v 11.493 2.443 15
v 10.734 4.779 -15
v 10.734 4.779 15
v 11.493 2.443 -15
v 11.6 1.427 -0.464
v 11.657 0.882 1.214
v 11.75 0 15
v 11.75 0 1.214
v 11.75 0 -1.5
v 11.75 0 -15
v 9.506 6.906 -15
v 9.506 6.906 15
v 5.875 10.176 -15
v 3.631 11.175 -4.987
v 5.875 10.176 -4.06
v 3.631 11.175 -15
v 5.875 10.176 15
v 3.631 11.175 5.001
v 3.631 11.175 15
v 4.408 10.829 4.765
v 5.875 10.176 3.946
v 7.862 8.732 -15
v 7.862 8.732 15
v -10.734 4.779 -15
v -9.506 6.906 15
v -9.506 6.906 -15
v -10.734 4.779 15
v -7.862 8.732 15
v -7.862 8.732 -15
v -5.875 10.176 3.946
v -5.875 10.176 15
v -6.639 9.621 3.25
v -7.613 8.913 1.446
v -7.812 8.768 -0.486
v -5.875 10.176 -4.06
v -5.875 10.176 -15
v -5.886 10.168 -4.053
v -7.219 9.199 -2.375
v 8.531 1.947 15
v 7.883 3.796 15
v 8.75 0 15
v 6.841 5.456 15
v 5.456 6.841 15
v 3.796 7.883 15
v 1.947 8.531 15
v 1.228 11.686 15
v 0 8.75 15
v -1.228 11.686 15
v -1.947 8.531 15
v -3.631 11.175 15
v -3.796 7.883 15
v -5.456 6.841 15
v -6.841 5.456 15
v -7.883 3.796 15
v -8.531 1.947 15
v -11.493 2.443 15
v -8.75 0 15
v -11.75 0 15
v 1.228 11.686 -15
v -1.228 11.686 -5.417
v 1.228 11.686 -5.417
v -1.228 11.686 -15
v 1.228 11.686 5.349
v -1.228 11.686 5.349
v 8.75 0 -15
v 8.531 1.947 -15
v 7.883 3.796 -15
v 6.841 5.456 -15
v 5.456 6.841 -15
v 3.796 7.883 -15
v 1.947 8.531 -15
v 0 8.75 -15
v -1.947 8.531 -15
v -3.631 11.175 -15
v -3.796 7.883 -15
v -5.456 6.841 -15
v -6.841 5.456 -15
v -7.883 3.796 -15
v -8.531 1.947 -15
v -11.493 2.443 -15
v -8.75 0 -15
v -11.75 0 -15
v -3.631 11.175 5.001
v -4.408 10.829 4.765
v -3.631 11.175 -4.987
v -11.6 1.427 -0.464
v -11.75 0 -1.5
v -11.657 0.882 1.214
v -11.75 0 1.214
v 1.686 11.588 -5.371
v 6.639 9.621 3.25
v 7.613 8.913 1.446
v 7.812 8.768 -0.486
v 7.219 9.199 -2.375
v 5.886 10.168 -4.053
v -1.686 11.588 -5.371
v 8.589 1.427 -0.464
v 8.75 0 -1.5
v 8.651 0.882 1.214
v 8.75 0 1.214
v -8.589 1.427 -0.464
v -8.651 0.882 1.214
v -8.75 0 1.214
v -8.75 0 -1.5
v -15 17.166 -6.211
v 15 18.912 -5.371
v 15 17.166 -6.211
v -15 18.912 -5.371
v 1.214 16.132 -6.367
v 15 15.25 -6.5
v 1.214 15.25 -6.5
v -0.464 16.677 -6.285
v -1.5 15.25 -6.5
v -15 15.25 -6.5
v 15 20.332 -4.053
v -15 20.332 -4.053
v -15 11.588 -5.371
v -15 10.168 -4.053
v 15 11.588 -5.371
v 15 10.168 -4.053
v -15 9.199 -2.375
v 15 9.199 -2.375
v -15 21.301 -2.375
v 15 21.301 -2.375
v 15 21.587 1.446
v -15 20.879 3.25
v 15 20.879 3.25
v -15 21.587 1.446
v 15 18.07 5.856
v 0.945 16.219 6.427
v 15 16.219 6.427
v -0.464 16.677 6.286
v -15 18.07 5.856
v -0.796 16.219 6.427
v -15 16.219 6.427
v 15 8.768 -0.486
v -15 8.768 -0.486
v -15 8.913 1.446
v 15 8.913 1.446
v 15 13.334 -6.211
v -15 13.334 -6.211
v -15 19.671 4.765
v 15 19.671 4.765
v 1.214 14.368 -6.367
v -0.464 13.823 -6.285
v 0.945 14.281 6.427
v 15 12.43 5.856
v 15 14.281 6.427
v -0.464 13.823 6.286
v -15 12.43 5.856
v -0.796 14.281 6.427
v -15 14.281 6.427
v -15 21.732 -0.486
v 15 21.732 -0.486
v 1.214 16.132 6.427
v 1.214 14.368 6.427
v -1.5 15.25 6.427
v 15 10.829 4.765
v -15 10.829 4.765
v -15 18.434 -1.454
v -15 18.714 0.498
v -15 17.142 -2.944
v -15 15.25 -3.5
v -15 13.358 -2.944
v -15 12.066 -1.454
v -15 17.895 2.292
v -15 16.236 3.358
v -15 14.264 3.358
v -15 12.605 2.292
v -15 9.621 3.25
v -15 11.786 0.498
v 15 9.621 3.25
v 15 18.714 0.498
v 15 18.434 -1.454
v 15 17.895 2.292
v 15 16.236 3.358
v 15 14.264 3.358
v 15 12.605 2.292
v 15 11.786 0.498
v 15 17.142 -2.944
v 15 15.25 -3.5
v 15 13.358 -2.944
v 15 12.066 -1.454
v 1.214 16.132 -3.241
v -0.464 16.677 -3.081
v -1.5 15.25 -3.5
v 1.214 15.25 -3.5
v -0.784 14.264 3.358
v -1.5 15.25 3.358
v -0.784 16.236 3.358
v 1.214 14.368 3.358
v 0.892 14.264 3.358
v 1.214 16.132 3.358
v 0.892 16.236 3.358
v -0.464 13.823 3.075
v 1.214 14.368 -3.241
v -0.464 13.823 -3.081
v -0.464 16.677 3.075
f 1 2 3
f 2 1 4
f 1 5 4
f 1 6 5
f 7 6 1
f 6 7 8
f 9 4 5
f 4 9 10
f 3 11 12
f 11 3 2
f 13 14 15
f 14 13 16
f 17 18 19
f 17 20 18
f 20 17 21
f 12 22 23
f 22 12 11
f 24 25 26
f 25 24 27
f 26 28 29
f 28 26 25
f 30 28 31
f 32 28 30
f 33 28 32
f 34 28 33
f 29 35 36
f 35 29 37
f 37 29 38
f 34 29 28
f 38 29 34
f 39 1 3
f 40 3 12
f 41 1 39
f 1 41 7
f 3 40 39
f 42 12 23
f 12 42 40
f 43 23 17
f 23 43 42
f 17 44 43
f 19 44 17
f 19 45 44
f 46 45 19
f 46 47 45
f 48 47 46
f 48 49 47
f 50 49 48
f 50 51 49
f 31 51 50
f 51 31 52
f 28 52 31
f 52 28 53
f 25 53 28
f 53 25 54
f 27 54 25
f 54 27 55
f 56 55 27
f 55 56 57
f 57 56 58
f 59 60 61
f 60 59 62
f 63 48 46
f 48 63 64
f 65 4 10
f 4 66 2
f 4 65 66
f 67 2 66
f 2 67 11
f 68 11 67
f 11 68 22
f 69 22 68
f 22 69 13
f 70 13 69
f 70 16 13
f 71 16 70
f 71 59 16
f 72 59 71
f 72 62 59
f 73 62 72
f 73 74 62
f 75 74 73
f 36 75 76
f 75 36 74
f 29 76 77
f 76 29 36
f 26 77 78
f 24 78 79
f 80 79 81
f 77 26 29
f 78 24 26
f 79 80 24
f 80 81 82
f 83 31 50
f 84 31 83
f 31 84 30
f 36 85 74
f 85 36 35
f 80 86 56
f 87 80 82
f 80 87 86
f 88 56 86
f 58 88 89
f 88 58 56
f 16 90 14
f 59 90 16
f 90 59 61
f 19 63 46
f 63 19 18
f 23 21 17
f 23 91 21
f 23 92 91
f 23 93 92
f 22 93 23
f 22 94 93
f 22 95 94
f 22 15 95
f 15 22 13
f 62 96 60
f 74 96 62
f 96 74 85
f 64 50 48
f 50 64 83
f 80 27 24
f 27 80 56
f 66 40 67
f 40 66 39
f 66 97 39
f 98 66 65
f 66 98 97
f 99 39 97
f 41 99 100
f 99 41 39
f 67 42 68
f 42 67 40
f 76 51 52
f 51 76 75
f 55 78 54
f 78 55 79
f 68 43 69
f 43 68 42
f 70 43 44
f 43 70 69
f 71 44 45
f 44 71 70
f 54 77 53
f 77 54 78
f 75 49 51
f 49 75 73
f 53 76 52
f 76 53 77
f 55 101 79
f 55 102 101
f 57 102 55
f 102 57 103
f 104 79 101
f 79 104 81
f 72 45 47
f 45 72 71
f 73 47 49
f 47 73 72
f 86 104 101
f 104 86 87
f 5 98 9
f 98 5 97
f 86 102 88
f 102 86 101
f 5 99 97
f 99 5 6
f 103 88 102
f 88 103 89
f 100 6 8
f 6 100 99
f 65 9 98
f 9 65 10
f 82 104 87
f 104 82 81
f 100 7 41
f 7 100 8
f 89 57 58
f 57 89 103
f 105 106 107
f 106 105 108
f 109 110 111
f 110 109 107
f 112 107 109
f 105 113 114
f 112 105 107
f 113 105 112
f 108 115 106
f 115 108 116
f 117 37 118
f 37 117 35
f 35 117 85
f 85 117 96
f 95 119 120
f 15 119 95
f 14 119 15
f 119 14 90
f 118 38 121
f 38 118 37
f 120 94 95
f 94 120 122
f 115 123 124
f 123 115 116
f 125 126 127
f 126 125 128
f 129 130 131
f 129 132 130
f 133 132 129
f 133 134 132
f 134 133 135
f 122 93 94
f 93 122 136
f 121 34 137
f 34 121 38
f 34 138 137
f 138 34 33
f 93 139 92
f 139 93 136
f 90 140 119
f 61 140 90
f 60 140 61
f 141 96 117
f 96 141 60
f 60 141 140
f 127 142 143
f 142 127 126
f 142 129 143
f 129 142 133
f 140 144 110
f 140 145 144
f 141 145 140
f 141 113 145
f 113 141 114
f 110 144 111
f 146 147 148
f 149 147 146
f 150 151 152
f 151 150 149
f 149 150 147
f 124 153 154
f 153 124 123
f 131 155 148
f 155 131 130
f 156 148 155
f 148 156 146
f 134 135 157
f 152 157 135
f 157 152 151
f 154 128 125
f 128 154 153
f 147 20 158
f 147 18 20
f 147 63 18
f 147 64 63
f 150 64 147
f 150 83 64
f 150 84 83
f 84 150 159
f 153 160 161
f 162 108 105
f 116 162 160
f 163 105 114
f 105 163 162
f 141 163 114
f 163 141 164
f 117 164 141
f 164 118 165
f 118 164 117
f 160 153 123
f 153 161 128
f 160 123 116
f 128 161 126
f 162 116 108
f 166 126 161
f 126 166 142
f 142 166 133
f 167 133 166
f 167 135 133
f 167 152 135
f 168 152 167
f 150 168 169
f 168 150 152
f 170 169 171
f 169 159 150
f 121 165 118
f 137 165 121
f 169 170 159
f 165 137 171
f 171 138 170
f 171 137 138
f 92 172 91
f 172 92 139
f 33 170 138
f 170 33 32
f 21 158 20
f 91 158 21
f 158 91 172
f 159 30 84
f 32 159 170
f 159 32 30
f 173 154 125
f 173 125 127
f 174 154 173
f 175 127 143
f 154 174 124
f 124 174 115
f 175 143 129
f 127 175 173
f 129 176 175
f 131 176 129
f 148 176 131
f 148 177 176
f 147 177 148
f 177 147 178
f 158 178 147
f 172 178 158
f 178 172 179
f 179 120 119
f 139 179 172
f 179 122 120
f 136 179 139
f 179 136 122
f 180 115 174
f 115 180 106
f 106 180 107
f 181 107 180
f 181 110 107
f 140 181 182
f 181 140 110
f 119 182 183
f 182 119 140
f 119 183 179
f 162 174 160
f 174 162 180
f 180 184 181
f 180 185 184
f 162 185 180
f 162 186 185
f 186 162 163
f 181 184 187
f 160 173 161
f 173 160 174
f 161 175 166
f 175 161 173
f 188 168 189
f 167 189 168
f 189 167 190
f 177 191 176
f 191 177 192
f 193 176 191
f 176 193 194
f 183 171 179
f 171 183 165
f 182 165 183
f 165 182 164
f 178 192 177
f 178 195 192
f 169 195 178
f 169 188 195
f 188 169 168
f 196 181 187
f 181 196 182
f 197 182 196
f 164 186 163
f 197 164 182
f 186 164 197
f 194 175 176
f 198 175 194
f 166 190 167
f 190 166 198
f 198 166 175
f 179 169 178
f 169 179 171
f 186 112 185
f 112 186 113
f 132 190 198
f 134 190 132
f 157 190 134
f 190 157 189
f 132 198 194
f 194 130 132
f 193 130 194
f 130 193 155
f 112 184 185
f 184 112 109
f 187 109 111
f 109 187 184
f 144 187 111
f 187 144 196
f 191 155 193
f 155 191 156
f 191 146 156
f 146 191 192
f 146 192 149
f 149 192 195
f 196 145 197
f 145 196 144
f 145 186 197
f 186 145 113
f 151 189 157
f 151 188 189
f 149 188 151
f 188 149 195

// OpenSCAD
// file units are mm
WALL_THICKNESS = 3;
DIAMETER_OFFSET = 1;
HOOK_DIAMETER = 16.5;
AXLE_DIAMETER = 6;
SCREW_DIAMETER = 3;
INFTY = 100;

union() {
  difference() {  // to hook piece
    inner = (HOOK_DIAMETER + DIAMETER_OFFSET) / 2;
    outer = inner + WALL_THICKNESS;
    screw = SCREW_DIAMETER / 2;

    cylinder(r1=outer, r2=outer, h=30, center=true);
    cylinder(r1=inner, r2=inner, h=30, center=true);
    rotate([0, 90, 0])
      cylinder(r1=screw, r2=screw, h=INFTY, center=true);
    translate([0, -INFTY / 2, 0])
      cube([INFTY, INFTY, INFTY], true);
  }
  rotate([0, 90, 0])  // to axle piece
    translate([0, (HOOK_DIAMETER + AXLE_DIAMETER) / 2 + WALL_THICKNESS + 1, 0])
      difference() {
        inner = (AXLE_DIAMETER + DIAMETER_OFFSET) / 2;
        outer = inner + WALL_THICKNESS;
        screw = SCREW_DIAMETER / 2;

        cylinder(r1=outer, r2=outer, h=30, center=true);
        cylinder(r1=inner, r2=inner, h=30, center=true);
        rotate([0, 90, 0])
          cylinder(r1=screw, r2=screw, h=INFTY, center=true);
      }
}
